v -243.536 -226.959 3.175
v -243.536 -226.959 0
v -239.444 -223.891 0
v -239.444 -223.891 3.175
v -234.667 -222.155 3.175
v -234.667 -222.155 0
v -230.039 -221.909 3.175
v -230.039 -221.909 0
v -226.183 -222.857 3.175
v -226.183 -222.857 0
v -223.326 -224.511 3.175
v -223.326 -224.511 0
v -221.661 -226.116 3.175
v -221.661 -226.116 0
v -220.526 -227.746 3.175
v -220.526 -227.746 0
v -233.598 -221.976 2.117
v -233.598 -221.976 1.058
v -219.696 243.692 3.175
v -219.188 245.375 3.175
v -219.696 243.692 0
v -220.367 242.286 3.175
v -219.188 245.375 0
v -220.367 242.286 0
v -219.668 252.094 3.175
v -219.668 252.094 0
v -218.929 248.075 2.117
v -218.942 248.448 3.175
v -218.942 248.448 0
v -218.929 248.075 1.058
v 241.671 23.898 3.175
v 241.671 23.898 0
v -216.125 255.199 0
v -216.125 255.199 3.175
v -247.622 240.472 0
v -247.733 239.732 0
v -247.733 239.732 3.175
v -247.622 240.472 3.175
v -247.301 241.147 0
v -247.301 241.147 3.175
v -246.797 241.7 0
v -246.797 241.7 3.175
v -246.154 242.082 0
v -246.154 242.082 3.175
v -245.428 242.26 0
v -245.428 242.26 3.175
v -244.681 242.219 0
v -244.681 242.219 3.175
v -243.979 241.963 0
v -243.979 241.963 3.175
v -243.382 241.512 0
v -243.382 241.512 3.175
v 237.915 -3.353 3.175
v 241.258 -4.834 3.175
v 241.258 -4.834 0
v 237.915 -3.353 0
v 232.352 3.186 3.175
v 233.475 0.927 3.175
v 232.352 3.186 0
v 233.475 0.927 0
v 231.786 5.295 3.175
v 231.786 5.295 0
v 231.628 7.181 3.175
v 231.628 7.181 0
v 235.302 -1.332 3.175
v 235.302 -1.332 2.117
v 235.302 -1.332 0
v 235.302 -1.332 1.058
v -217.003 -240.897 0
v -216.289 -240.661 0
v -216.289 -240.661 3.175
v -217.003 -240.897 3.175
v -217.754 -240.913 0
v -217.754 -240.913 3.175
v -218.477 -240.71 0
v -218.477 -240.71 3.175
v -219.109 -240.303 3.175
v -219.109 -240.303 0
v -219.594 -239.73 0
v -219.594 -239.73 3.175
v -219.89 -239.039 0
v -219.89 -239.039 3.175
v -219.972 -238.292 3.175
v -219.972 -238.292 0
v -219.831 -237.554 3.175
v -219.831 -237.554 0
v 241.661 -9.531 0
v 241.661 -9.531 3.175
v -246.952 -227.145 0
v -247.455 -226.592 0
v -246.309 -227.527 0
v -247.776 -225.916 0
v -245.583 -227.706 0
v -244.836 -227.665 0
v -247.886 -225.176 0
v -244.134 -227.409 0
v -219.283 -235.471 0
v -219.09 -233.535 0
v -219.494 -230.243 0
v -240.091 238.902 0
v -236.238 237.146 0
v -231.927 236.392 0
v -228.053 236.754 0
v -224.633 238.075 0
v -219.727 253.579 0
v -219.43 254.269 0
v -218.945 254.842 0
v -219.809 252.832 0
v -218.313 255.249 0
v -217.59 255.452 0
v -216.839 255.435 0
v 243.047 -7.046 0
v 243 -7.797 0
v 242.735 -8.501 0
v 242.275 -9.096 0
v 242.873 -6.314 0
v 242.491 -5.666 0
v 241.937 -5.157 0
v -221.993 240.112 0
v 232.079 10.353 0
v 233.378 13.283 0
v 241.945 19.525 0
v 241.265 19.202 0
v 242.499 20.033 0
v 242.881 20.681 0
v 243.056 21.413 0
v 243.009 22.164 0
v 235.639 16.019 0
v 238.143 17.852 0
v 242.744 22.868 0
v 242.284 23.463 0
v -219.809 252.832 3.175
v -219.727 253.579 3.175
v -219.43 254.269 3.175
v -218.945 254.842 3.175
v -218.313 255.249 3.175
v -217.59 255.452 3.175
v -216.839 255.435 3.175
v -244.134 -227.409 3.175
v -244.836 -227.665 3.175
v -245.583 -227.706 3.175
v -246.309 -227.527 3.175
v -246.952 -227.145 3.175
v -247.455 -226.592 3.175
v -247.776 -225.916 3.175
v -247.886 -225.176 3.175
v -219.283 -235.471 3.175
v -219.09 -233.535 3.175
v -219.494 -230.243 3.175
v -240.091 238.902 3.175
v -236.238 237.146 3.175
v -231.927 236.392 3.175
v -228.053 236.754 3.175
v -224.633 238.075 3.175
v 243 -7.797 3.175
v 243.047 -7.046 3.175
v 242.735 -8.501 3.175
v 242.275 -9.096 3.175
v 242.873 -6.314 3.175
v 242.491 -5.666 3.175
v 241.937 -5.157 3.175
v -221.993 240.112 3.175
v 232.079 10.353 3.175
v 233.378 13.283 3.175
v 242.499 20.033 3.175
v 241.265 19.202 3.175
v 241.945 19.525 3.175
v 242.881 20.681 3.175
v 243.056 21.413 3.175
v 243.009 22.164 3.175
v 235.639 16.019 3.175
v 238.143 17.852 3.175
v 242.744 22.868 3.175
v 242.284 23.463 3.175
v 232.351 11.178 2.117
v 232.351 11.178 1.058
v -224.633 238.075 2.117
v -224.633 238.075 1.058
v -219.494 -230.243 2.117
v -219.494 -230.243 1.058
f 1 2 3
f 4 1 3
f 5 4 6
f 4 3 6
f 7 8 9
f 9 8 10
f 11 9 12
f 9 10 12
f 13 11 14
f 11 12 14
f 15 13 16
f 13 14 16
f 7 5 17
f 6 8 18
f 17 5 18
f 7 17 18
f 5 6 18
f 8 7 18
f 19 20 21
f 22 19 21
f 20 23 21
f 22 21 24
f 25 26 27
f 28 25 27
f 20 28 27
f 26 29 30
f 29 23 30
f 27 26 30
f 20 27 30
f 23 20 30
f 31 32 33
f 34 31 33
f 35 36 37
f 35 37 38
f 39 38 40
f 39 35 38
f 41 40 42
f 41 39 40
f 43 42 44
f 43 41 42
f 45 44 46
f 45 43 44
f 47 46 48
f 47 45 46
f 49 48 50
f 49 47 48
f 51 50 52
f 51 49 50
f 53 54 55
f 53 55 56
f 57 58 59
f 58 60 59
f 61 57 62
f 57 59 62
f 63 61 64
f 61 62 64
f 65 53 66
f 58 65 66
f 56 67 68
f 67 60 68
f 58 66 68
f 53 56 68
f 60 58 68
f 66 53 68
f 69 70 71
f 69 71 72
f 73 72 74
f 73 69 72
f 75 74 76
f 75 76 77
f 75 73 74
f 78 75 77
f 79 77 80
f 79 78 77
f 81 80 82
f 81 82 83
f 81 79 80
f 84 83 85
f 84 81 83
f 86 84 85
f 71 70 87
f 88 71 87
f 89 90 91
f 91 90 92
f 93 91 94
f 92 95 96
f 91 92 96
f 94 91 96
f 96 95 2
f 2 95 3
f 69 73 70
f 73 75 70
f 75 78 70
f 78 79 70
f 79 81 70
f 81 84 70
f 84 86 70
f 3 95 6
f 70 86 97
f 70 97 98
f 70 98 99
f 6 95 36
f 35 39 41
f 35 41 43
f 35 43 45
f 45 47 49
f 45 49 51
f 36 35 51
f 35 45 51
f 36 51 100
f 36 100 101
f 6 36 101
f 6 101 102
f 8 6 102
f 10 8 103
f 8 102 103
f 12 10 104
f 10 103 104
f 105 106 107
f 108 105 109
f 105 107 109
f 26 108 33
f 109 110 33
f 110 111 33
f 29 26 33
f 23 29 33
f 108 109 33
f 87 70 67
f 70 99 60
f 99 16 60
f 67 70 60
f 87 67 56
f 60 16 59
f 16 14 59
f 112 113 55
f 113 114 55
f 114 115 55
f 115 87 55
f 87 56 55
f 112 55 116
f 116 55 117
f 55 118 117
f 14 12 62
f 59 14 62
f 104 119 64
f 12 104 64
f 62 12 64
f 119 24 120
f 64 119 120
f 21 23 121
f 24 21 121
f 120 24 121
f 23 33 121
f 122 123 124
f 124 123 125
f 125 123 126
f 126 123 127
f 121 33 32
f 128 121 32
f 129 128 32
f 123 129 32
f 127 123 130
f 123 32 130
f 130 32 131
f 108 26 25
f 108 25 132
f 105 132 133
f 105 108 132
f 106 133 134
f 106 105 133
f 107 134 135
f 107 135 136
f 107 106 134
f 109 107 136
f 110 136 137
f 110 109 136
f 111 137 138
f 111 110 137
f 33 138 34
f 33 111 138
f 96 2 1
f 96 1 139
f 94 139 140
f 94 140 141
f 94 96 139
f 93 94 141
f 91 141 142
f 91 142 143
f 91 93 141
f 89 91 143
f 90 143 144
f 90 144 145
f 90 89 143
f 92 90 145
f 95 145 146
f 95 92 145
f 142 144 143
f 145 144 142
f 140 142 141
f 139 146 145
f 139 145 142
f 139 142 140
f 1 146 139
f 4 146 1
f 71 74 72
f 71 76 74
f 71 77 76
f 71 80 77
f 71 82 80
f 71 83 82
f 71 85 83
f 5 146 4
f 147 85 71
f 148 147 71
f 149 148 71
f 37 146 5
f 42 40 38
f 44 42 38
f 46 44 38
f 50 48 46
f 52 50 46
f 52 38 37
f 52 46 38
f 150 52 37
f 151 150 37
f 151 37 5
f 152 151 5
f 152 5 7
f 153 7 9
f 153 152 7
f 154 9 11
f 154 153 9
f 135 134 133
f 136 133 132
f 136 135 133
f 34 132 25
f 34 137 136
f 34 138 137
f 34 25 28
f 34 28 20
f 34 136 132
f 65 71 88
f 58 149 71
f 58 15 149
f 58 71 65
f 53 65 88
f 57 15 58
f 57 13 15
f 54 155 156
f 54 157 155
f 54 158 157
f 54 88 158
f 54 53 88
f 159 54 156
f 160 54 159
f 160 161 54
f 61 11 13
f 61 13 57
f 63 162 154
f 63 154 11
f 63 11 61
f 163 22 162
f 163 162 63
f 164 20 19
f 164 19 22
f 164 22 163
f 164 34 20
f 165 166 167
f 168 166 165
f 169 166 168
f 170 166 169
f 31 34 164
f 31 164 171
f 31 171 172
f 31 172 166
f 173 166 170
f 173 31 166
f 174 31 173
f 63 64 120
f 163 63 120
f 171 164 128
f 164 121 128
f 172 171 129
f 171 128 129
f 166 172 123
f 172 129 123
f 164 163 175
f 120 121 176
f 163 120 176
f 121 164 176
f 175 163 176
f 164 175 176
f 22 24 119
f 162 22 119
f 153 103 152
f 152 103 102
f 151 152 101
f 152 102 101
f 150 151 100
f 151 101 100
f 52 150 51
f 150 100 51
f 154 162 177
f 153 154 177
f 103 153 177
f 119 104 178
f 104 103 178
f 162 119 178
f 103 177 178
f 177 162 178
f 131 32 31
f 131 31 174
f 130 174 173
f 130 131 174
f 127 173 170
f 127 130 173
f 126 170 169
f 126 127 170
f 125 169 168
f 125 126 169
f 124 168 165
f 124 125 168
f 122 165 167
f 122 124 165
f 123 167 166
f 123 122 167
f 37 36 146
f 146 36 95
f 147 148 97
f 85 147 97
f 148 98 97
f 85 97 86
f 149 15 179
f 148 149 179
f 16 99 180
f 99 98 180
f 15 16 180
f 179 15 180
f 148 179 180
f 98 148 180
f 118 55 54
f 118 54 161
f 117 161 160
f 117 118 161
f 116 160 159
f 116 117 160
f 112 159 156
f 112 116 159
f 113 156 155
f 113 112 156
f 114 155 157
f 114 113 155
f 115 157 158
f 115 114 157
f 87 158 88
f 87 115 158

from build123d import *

# Parameters (mm, degrees)
BOSS_EXTRUDE1_DEPTH = 3.175
FILLET1_START       = -1
FILLET1_DEPTH       = 5


with BuildPart() as part:
    # Sketch2 → Boss-Extrude1 (new body)
    with BuildSketch(Plane.XY):
        with BuildLine():
            Line((252.882647522, 18.233509916), (-227.808389099, 261.102259727))
            add(Edge.make_bspline(
                [(-227.808389099, 261.102259727), (-218.508408171, 256.403452033), (-217.090340448, 248.048262702), (-220.367085383, 242.285684549)],
                knots=[0.742781474, 0.742781474, 0.742781474, 0.742781474, 1, 1, 1, 1], degree=3, weights=[0.500416857, 0.490514251, 0.657041966, 1]))
            add(Edge.make_bspline(
                [(-220.367085383, 242.285684549), (-227.805809429, 229.203729887), (-247.735230176, 231.479633917), (-247.728634027, 251.479512649)],
                knots=[0, 0, 0, 0, 0.406744285, 0.406744285, 0.406744285, 0.406744285], degree=3, weights=[1, 0.457674286, 0.356524342, 0.696550168]))
            Line((-247.728634027, 251.479512649), (-247.88971408, -236.923885776))
            add(Edge.make_bspline(
                [(-247.88971408, -236.923885776), (-247.883118871, -216.926855588), (-227.957336221, -214.663599199), (-220.525871765, -227.745847533)],
                knots=[0.593296933, 0.593296933, 0.593296933, 0.593296933, 1, 1, 1, 1], degree=3, weights=[0.696446809, 0.356544847, 0.457729245, 1]))
            add(Edge.make_bspline(
                [(-220.525871765, -227.745847533), (-217.251599097, -233.509832332), (-218.672940969, -241.864237022), (-227.974334939, -246.55870873)],
                knots=[0, 0, 0, 0, 0.25721856, 0.25721856, 0.25721856, 0.25721856], degree=3, weights=[1, 0.65704192, 0.490514207, 0.500416861]))
            Line((-227.974334939, -246.55870873), (252.876255857, -3.870408269))
            add(Edge.make_bspline(
                [(252.876255857, -3.870408269), (240.565044662, -10.083953555), (231.629829811, -2.056184754), (231.628366282, 7.18068181)],
                knots=[0.684200569, 0.684200569, 0.684200569, 0.684200569, 1, 1, 1, 1], degree=3, weights=[0.534636521, 0.423812933, 0.578934092, 1]))
            add(Edge.make_bspline(
                [(231.628366282, 7.18068181), (231.626901898, 16.422942754), (240.567824747, 24.455563967), (252.882647522, 18.233509916)],
                knots=[0, 0, 0, 0, 0.315906176, 0.315906176, 0.315906176, 0.315906176], degree=3, weights=[1, 0.578791765, 0.423708096, 0.534748993]))
        make_face()
    extrude(amount=BOSS_EXTRUDE1_DEPTH)

    # Fillet1: read off the stored shape, not the designer's step
    # Fillet1 outline → Fillet1 (cut)
    with BuildSketch(Plane.XY.offset(FILLET1_START)):
        with BuildLine():
            Line((-247.728634027, 251.479512649), (-247.73250842, 239.732143832))
            ThreePointArc((-247.73250842, 239.732143832), (-246.154410329, 242.082124056), (-243.381643145, 241.512419941))
            add(Edge.make_bspline(
                [(-243.381643145, 241.512419941), (-246.348546976, 244.528882707), (-247.729754583, 248.081924898), (-247.728634027, 251.479512649)],
                knots=[1.290568731, 1.290568731, 1.290568731, 1.290568731, 1.406744285, 1.406744285, 1.406744285, 1.406744285], degree=3, weights=[0.513166576, 0.538303082, 0.599430946, 0.696550168]))
        make_face()
        with BuildLine():
            ThreePointArc((-243.536134042, -226.959195307), (-246.309281681, -227.52709022), (-247.885839538, -225.176065383))
            Line((-247.885839538, -225.176065383), (-247.88971408, -236.923885776))
            add(Edge.make_bspline(
                [(-247.88971408, -236.923885776), (-247.888593429, -233.526010078), (-246.504981138, -229.973706223), (-243.536134042, -226.959195307)],
                knots=[0.593296933, 0.593296933, 0.593296933, 0.593296933, 0.709466339, 0.709466339, 0.709466339, 0.709466339], degree=3, weights=[0.696446809, 0.599358264, 0.538257269, 0.513143822]))
        make_face()
        with BuildLine():
            add(Edge.make_bspline(
                [(-227.808389099, 261.102259727), (-223.785212041, 259.069552836), (-220.970894654, 255.819508956), (-219.668408897, 252.094046153)],
                knots=[0.742781474, 0.742781474, 0.742781474, 0.742781474, 0.855317926, 0.855317926, 0.855317926, 0.855317926], degree=3, weights=[0.500416857, 0.496084338, 0.525523694, 0.588734925]))
            ThreePointArc((-219.668408897, 252.094046153), (-218.944883502, 254.842497831), (-216.125289867, 255.199383475))
            Line((-216.125289867, 255.199383475), (-227.808389099, 261.102259727))
        make_face()
        with BuildLine():
            ThreePointArc((-216.289382855, -240.661240335), (-219.108792384, -240.303160787), (-219.831184056, -237.554444482))
            add(Edge.make_bspline(
                [(-219.831184056, -237.554444482), (-221.135109685, -241.279221567), (-223.950577298, -244.527893084), (-227.974334939, -246.55870873)],
                knots=[1.144682938, 1.144682938, 1.144682938, 1.144682938, 1.25721856, 1.25721856, 1.25721856, 1.25721856], degree=3, weights=[0.588733468, 0.525523222, 0.496084353, 0.500416861]))
            Line((-227.974334939, -246.55870873), (-216.289382855, -240.661240335))
        make_face()
        with BuildLine():
            Line((252.882647522, 18.233509916), (241.670605569, 23.898384866))
            ThreePointArc((241.670605569, 23.898384866), (243.055767599, 21.412939134), (241.265285671, 19.201539396))
            add(Edge.make_bspline(
                [(241.265285671, 19.201539396), (245.20247003, 20.400808532), (249.313639066, 20.036748495), (252.882647522, 18.233509916)],
                knots=[1.208515124, 1.208515124, 1.208515124, 1.208515124, 1.315906176, 1.315906176, 1.315906176, 1.315906176], degree=3, weights=[0.513767959, 0.490007402, 0.49700108, 0.534748993]))
        make_face()
        with BuildLine():
            ThreePointArc((241.25790796, -4.833713175), (243.047416072, -7.045891114), (241.661178159, -9.530728124))
            Line((241.661178159, -9.530728124), (252.876255857, -3.870408269))
            add(Edge.make_bspline(
                [(252.876255857, -3.870408269), (249.305839521, -5.672419724), (245.194273266, -6.034625453), (241.25790796, -4.833713175)],
                knots=[0.684200569, 0.684200569, 0.684200569, 0.684200569, 0.791591528, 0.791591528, 0.791591528, 0.791591528], degree=3, weights=[0.534636521, 0.49694978, 0.49001722, 0.513838842]))
        make_face()
    extrude(amount=FILLET1_DEPTH, mode=Mode.SUBTRACT)


solid = part.part
